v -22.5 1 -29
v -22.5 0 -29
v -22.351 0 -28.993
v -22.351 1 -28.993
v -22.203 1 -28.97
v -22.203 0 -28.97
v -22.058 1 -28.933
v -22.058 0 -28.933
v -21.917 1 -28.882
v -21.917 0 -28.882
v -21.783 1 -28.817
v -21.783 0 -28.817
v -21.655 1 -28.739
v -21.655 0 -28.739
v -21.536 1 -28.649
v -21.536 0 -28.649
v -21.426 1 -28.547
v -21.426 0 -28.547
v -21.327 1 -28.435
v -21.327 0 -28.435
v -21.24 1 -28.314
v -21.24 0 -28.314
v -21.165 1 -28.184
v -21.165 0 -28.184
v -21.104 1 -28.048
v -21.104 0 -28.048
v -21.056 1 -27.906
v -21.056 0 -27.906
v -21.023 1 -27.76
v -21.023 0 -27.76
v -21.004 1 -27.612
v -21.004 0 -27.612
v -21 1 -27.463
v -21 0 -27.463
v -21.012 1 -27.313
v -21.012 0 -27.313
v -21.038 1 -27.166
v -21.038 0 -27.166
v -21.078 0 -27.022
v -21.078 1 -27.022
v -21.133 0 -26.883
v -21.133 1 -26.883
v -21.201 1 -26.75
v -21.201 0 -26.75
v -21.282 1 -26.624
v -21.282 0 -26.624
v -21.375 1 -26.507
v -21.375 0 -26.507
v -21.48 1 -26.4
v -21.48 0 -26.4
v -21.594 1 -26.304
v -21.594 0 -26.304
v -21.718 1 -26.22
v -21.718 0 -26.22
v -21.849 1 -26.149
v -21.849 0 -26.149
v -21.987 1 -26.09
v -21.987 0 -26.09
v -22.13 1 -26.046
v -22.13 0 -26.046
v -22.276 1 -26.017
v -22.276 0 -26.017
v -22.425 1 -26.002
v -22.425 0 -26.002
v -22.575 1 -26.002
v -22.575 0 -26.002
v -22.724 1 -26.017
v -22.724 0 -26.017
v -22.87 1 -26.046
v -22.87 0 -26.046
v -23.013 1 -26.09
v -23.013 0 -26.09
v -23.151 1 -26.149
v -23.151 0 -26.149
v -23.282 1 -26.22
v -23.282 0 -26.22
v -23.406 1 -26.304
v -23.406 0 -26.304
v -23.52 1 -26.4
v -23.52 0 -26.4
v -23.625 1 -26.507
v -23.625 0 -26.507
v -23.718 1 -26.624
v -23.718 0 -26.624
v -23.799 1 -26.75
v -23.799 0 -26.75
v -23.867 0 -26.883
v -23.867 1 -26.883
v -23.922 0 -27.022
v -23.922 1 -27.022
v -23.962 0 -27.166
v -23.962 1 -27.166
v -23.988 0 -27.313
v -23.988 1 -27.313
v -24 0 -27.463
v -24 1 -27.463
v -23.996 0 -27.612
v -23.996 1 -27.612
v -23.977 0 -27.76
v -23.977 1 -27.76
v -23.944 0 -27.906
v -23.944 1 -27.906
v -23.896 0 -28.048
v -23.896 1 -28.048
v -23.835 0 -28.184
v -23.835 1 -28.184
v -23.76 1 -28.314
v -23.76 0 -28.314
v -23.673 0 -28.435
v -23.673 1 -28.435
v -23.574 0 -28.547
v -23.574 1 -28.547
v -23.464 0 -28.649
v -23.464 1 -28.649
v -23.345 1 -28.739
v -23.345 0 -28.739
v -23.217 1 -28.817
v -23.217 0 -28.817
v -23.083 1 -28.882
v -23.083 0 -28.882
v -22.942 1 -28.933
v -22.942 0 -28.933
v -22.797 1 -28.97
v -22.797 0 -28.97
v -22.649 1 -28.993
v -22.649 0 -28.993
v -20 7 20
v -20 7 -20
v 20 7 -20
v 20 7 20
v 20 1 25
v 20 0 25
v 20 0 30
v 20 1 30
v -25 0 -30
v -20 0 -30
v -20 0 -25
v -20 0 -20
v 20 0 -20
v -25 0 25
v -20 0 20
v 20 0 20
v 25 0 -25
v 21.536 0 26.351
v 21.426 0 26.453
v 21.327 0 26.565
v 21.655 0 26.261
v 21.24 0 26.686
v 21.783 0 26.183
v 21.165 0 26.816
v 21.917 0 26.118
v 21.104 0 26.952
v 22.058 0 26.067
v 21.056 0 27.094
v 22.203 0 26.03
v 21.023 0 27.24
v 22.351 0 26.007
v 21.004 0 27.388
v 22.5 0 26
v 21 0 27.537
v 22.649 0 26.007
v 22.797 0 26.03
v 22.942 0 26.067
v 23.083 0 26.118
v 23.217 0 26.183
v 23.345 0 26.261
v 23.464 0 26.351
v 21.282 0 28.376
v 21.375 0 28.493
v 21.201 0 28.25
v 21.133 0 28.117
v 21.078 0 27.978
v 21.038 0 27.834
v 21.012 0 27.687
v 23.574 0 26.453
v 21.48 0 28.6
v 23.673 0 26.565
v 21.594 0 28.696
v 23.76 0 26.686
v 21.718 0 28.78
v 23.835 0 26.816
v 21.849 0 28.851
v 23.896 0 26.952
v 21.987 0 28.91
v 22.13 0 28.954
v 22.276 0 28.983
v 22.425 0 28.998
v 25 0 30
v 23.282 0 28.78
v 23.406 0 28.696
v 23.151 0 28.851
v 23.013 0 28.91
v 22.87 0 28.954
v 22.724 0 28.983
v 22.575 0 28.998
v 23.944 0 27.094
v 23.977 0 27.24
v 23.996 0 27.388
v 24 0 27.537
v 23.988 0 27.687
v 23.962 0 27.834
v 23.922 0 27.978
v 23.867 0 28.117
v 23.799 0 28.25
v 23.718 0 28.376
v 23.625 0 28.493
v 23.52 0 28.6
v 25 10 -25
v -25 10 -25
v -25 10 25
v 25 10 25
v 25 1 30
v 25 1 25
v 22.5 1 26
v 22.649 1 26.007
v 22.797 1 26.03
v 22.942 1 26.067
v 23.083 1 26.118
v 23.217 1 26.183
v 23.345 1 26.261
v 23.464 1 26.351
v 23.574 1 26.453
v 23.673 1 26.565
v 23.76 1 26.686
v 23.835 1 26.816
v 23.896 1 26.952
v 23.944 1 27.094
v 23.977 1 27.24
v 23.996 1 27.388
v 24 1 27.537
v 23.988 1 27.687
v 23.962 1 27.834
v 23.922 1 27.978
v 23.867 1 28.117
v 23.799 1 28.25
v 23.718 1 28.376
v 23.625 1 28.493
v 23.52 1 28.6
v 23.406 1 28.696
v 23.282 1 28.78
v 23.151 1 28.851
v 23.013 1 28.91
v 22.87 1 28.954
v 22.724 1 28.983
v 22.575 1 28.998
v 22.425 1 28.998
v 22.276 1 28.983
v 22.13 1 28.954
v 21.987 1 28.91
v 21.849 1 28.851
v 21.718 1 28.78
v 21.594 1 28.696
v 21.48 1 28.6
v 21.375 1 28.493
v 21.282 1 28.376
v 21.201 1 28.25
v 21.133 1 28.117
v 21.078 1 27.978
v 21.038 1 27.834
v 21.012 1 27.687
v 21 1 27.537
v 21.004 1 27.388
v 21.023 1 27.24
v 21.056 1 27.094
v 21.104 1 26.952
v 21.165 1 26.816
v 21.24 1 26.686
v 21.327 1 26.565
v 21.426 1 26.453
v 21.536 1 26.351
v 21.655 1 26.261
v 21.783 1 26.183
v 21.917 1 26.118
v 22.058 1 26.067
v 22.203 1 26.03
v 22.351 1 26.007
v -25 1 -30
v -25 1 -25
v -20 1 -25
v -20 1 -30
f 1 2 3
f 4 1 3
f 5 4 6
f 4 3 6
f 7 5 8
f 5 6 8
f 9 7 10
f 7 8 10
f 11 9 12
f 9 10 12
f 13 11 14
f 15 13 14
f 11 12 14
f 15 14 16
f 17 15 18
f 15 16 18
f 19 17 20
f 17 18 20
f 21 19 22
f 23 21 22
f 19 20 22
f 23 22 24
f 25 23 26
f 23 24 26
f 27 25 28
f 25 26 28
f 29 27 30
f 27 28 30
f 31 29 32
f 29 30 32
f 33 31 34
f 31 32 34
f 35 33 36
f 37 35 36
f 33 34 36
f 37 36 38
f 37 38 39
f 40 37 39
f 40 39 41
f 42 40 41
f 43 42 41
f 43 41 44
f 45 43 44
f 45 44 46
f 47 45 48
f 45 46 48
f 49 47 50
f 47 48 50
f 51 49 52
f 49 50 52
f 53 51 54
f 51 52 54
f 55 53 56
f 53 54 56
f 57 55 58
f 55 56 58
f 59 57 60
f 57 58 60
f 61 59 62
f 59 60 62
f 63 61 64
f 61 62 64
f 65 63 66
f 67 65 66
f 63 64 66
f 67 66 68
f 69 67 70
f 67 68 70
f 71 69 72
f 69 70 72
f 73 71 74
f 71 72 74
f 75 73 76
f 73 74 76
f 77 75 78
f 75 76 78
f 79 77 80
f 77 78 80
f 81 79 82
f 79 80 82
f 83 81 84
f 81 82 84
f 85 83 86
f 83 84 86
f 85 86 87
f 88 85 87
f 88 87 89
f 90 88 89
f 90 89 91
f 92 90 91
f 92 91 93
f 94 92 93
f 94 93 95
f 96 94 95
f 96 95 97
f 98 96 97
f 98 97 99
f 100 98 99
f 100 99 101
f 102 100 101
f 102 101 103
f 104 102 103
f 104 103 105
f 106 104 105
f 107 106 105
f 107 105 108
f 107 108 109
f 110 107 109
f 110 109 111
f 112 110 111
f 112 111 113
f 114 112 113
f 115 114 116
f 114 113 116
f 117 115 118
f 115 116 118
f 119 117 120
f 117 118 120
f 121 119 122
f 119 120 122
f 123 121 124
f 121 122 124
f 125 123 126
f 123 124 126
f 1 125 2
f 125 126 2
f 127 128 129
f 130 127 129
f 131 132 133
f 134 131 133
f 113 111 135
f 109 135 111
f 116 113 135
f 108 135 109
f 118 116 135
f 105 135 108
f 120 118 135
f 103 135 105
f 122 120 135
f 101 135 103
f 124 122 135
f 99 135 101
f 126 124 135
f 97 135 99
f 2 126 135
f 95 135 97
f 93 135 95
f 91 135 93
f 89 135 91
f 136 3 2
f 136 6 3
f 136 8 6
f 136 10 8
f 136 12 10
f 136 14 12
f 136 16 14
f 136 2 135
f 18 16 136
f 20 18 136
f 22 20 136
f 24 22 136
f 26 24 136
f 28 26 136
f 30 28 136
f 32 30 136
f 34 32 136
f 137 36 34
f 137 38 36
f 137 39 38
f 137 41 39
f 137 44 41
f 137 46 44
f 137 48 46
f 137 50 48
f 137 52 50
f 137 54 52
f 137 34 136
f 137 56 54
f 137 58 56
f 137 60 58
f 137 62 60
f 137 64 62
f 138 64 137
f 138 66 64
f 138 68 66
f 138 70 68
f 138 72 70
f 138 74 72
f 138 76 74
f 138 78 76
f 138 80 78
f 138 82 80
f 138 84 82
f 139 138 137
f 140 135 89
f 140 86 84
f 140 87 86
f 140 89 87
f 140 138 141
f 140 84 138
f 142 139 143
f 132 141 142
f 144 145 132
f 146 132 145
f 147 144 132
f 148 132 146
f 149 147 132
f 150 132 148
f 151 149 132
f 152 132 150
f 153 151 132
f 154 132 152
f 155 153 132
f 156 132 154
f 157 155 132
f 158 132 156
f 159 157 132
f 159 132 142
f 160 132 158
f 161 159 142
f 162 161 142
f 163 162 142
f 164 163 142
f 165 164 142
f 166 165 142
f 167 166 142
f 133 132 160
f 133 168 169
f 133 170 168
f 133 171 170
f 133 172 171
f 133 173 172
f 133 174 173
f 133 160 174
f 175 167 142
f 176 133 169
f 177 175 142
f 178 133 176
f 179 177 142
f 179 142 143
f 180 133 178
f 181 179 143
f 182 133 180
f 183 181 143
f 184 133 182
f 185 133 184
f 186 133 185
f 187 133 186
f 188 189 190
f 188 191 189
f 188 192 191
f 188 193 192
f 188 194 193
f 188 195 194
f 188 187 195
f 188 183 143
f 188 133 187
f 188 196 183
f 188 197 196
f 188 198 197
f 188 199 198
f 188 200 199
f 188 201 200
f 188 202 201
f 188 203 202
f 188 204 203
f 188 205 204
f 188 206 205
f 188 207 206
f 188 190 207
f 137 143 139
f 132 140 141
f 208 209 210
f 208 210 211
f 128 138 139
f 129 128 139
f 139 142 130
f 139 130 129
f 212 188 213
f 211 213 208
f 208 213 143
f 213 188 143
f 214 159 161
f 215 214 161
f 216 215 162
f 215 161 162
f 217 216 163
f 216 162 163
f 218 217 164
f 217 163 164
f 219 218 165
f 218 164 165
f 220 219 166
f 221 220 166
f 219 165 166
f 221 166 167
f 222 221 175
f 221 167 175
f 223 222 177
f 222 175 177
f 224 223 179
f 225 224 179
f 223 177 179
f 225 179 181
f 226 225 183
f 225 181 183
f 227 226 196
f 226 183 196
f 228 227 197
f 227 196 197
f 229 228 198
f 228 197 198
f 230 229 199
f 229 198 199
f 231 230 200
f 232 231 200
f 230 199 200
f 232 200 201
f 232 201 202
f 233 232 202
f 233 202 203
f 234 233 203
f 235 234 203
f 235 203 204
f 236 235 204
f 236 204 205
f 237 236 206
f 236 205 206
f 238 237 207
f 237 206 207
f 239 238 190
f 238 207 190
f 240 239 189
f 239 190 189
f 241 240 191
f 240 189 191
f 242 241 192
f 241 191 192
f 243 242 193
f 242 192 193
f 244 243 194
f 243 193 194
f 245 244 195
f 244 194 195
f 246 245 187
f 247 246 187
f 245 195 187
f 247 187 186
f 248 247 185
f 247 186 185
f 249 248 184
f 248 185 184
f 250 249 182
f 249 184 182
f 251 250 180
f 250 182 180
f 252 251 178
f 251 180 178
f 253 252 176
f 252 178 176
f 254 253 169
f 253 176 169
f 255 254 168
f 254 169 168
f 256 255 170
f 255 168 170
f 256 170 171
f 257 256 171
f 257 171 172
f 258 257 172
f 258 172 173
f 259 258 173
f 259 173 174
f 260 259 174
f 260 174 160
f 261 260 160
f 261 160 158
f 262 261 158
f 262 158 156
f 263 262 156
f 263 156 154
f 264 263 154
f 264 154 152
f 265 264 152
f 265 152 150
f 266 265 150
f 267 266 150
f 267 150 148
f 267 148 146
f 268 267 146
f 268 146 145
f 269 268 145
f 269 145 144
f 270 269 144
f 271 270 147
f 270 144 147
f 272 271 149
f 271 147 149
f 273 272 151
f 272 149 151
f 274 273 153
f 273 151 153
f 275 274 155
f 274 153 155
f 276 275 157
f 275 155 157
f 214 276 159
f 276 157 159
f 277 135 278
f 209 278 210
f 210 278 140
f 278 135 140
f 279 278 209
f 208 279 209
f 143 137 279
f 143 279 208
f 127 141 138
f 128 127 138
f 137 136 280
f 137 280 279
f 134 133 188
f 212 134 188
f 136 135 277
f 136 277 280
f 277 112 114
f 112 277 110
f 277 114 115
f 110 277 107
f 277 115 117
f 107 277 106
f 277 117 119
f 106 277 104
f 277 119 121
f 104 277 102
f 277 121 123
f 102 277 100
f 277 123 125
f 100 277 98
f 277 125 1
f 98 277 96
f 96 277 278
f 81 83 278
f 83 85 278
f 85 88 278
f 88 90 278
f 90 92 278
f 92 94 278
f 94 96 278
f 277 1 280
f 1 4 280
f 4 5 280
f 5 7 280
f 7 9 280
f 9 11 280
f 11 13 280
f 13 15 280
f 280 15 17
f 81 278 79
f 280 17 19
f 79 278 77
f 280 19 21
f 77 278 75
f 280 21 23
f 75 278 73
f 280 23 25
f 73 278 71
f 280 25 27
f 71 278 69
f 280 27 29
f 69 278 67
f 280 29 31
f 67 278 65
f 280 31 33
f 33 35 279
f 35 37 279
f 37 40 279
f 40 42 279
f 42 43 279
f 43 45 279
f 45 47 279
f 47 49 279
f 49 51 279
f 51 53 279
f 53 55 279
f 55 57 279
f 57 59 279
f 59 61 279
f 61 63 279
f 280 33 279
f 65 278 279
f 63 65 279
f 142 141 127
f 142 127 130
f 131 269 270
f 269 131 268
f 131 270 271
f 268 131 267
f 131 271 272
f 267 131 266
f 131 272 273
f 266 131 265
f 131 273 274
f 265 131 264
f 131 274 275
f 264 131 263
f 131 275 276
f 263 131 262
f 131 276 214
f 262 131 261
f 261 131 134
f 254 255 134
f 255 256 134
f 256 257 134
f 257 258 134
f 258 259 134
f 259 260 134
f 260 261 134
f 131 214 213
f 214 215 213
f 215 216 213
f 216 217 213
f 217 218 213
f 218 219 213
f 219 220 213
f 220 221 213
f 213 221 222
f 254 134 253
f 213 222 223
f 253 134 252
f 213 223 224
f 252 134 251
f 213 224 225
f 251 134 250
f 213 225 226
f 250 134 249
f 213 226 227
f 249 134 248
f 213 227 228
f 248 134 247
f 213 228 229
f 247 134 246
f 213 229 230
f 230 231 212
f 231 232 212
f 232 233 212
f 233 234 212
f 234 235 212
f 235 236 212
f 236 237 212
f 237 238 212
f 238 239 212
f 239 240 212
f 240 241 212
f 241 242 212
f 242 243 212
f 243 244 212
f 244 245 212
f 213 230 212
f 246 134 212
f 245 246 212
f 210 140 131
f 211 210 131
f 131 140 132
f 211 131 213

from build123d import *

# Parameters (mm, degrees)
SKETCH4_W           = 50
SKETCH4_H           = 50
BOSS_EXTRUDE1_DEPTH = 10
SKETCH5_W           = 40
SKETCH5_H           = 40
CUT_EXTRUDE1_DEPTH  = 7
SKETCH9_W           = 5
SKETCH9_H           = 5
SKETCH9_R           = 1.5
BOSS_EXTRUDE4_DEPTH = 1


with BuildPart() as part:
    # Sketch4 → Boss-Extrude1 (new body)
    with BuildSketch(Plane(origin=(0, 0, 0), x_dir=(1, 0, 0), z_dir=(0, 1, 0))):
        Rectangle(SKETCH4_W, SKETCH4_H)
    extrude(amount=BOSS_EXTRUDE1_DEPTH)

    # Sketch5 → Cut-Extrude1 (cut)
    with BuildSketch(Plane(origin=(0, 0, 0), x_dir=(1, 0, 0), z_dir=(0, 1, 0))):
        Rectangle(SKETCH5_W, SKETCH5_H)
    extrude(amount=CUT_EXTRUDE1_DEPTH, mode=Mode.SUBTRACT)

    # Sketch9 → Boss-Extrude4 (add)
    with BuildSketch(Plane.XZ):
        with Locations((-22.5, -27.5)):
            Rectangle(SKETCH9_W, SKETCH9_H)
        with Locations(Location((-22.5, -27.5, 0), (0, 0, 270))):  # turned: the seam where the file's is
            Circle(SKETCH9_R, mode=Mode.SUBTRACT)
        with Locations((22.5, 27.5)):
            Rectangle(SKETCH9_W, SKETCH9_H)
        with Locations(Location((22.5, 27.5, 0), (0, 0, 270))):  # turned: the seam where the file's is
            Circle(SKETCH9_R, mode=Mode.SUBTRACT)
    extrude(amount=-BOSS_EXTRUDE4_DEPTH)


solid = part.part
